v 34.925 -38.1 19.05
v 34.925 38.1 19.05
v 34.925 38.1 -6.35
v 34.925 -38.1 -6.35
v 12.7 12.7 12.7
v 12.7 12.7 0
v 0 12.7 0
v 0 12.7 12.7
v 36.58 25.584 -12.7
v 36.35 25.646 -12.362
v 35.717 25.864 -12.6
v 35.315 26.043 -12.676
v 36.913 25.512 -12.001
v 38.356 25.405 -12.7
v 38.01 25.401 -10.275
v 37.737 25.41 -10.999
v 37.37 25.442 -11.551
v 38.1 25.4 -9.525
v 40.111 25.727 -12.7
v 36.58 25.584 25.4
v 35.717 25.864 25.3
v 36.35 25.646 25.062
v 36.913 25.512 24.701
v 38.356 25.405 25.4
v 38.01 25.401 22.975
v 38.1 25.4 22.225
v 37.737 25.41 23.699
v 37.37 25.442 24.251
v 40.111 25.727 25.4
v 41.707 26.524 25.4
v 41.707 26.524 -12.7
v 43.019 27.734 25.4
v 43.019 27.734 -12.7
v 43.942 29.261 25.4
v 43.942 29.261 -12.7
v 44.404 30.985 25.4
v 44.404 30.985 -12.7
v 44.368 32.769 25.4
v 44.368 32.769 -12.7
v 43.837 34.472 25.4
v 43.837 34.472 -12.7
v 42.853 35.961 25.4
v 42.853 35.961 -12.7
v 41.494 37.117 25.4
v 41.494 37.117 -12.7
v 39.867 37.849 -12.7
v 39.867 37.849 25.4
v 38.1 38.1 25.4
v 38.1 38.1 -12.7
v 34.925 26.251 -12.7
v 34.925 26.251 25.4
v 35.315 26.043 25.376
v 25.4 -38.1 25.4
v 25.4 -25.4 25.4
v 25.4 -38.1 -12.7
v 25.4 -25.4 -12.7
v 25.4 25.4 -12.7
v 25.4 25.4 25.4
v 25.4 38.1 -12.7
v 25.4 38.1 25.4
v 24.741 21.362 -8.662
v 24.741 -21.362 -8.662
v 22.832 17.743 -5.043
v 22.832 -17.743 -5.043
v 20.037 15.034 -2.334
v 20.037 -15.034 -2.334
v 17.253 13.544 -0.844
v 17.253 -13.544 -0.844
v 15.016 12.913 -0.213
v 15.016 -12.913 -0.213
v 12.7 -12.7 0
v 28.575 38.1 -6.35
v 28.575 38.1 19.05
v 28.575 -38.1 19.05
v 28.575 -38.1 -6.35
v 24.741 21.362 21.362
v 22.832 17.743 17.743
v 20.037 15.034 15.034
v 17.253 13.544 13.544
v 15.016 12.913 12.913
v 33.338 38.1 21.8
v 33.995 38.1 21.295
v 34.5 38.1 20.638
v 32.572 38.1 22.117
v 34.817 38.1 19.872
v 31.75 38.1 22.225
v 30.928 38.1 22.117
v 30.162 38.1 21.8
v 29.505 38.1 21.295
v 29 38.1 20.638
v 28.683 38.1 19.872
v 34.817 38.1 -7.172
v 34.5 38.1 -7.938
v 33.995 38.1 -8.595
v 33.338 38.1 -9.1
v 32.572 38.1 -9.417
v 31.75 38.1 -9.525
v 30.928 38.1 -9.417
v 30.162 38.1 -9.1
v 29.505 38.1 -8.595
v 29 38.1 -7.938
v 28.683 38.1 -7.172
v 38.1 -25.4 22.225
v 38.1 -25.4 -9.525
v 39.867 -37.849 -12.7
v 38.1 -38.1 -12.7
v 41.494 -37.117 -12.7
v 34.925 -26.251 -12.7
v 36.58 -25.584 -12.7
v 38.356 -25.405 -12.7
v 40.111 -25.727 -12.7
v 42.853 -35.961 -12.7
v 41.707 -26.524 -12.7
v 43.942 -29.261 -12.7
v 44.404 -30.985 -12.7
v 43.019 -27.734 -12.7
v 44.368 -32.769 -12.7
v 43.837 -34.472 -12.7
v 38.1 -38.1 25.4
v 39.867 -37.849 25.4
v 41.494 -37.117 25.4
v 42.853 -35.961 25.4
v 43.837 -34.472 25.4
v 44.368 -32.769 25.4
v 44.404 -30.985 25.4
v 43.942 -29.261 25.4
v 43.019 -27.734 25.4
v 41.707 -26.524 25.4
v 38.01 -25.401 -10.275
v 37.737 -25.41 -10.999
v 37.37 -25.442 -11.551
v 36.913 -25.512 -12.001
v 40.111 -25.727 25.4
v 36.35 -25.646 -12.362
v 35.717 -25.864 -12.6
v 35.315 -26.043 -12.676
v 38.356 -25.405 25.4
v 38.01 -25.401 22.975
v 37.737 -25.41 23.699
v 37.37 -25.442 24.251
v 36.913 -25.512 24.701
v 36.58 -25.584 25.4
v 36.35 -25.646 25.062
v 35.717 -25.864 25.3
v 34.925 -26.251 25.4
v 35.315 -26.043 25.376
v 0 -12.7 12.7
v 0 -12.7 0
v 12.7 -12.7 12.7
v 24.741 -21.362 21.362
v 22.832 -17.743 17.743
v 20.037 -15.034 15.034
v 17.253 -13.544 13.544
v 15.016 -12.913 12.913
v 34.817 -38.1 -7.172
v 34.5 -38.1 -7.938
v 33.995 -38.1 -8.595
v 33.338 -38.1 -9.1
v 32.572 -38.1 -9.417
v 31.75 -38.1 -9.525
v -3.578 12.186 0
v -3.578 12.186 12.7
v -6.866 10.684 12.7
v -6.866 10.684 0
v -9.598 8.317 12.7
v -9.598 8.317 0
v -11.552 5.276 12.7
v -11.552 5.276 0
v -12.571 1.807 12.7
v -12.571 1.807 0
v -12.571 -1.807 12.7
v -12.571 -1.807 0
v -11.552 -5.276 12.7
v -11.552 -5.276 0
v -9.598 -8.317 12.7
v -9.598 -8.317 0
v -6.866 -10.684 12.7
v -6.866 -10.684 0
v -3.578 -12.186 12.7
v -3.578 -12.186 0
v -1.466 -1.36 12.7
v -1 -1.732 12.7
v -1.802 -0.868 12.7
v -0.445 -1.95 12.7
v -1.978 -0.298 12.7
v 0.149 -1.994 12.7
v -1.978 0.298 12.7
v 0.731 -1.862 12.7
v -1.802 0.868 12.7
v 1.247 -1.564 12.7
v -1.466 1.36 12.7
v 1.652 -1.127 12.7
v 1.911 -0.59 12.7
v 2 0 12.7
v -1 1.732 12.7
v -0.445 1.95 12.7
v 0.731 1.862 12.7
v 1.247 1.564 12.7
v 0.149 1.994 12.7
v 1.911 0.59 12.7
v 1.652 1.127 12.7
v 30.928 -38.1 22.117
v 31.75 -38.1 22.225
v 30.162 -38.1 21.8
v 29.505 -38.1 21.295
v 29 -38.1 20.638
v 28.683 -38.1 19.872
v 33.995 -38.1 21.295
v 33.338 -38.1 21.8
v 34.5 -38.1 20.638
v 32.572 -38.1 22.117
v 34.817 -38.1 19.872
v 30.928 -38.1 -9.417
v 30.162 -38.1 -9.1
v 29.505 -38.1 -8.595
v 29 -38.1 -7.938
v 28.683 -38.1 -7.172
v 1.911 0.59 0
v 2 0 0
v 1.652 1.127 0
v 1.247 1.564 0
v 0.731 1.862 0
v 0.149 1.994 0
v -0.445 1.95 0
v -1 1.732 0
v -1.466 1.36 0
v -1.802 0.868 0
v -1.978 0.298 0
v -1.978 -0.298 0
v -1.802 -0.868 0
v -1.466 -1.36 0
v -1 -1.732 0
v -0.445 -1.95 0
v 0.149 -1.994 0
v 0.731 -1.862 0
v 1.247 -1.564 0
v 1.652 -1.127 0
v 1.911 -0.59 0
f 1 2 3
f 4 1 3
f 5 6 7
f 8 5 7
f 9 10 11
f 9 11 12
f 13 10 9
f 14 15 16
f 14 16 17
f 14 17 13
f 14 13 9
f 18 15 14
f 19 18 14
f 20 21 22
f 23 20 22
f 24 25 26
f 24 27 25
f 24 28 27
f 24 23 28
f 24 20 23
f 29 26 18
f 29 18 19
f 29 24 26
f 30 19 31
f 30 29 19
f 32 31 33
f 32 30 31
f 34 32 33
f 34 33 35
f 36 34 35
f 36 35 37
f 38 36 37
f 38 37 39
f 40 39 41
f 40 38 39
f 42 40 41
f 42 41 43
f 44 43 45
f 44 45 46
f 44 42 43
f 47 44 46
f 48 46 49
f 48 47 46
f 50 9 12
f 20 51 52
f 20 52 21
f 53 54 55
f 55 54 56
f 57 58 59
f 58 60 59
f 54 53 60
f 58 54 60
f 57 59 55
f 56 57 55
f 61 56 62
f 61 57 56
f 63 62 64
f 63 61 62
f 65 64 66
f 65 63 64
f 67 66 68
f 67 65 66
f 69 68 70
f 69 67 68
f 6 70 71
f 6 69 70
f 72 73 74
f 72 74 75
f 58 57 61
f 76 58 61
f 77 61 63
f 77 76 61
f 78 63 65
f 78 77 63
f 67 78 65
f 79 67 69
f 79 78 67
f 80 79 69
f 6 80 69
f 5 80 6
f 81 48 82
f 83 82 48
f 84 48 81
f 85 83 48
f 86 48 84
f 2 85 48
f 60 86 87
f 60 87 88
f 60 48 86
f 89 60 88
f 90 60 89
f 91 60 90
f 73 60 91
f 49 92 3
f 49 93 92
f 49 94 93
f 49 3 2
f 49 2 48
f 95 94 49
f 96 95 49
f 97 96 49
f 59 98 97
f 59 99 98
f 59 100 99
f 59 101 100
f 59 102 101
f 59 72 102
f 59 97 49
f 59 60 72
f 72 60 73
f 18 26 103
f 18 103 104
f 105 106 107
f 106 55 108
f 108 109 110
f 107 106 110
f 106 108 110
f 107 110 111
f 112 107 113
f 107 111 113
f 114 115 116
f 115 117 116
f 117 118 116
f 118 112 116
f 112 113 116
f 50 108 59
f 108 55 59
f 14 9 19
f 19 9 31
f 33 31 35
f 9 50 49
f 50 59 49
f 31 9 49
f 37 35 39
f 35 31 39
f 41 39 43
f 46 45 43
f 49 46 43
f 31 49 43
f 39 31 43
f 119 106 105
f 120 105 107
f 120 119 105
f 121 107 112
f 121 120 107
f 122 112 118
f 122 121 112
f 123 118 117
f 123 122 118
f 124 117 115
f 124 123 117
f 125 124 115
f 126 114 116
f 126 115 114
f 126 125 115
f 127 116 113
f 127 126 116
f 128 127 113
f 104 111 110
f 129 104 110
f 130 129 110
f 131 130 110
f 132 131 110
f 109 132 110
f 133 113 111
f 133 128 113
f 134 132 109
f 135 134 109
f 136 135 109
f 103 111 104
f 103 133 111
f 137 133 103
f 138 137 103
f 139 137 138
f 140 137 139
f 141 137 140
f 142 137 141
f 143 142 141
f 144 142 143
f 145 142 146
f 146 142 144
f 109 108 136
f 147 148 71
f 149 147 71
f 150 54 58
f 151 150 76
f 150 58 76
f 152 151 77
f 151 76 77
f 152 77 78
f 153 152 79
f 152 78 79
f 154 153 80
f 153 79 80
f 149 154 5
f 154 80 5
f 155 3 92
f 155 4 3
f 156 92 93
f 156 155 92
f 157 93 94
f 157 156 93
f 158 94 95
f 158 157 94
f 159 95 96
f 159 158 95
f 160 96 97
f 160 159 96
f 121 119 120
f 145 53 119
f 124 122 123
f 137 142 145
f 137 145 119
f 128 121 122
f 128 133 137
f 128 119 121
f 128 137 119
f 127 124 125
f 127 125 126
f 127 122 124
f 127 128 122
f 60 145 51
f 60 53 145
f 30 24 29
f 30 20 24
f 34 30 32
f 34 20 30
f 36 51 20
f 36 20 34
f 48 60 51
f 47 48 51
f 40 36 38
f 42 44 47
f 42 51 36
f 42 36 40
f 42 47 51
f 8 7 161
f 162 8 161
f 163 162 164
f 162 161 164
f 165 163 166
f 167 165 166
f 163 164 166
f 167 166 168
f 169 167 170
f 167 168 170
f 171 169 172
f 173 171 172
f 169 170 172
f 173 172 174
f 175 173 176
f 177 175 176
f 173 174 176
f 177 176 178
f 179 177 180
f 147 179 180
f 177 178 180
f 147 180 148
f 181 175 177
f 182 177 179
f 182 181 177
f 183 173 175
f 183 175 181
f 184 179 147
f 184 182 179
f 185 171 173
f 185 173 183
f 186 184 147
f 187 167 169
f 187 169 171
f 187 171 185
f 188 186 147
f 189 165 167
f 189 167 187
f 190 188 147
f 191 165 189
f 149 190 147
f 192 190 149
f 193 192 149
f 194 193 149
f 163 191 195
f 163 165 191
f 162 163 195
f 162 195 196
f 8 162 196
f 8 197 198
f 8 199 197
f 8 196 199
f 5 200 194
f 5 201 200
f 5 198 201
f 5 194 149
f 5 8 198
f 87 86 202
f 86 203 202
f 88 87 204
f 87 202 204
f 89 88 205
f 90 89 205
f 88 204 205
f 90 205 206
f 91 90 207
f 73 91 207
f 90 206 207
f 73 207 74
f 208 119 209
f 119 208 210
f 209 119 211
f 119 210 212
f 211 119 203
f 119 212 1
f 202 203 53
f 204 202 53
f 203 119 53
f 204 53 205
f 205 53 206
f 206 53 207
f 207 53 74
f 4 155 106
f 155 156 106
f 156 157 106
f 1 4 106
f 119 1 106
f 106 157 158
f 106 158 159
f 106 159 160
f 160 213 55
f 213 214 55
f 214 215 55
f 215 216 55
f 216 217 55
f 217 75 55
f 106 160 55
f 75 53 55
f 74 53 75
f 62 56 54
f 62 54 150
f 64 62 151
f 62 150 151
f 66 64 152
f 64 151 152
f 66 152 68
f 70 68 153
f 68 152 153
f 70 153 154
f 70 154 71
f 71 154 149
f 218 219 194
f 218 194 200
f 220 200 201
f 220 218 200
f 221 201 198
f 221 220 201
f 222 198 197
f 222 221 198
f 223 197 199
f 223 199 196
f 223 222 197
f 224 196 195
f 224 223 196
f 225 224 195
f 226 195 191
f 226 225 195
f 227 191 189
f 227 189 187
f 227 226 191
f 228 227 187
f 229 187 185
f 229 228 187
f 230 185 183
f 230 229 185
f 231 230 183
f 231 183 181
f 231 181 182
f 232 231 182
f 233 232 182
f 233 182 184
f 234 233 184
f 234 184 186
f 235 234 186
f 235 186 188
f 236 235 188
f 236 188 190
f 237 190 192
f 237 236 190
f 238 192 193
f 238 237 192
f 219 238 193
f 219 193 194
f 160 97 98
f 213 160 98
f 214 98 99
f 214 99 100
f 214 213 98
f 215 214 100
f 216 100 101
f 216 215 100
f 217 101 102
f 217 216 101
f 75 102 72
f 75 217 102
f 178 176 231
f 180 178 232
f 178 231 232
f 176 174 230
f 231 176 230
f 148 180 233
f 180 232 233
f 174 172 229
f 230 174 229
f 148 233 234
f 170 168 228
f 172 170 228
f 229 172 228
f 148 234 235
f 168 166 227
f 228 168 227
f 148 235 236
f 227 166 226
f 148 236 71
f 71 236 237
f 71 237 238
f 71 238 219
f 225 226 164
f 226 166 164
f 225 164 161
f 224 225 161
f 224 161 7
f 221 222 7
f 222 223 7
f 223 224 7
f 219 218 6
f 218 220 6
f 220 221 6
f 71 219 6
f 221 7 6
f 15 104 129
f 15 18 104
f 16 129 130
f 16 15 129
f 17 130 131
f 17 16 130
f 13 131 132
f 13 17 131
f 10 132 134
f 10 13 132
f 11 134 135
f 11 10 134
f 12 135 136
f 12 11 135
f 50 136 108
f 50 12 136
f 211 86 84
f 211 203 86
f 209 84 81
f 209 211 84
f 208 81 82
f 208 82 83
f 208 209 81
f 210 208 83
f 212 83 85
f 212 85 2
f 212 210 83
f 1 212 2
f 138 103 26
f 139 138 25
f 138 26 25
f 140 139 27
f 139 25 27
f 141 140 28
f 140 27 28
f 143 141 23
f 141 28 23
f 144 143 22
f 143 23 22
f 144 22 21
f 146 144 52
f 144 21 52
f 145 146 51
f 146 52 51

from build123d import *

# Parameters (mm, degrees)
SKETCH1_R           = 12.7
SKETCH1_R_2         = 2
BOSS_EXTRUDE1_DEPTH = 12.7
SKETCH2_W           = 38.1
SKETCH2_H           = 76.2
BOSS_EXTRUDE2_DEPTH = 12.7
FILLET1_R           = 12.7
SKETCH3_W           = 6.35
SKETCH3_H           = 31.75
CUT_EXTRUDE1_DEPTH  = 89.9
BOSS_EXTRUDE3_DEPTH = 38.1
FILLET2_R           = 3.175


with BuildPart() as part:
    # Sketch1 → Boss-Extrude1 (new body)
    # profile 1 of 2: a face of its own
    with BuildSketch(Plane.XY):
        Circle(SKETCH1_R)
        Circle(SKETCH1_R_2, mode=Mode.SUBTRACT)
    # profile 2 of 2: a face of its own
    with BuildSketch(Plane.XY):
        with BuildLine():
            ThreePointArc((12.7, 0), (8.980256121, -8.980256121), (0, -12.7))
            Line((0, -12.7), (25.4, -12.7))
            Line((25.4, -12.7), (25.4, 12.7))
            Line((25.4, 12.7), (0, 12.7))
            ThreePointArc((0, 12.7), (8.980256121, 8.980256121), (12.7, 0))
        make_face()
    extrude(amount=BOSS_EXTRUDE1_DEPTH)

    # Sketch2 → Boss-Extrude2 (add)
    with BuildSketch(Plane(origin=(25.4, 0, 0), x_dir=(0, 0, -1), z_dir=(1, 0, 0))):
        with Locations((-6.35, 0)):
            Rectangle(SKETCH2_W, SKETCH2_H)
    extrude(amount=BOSS_EXTRUDE2_DEPTH)

    # Fillet1
    fillet1_edges = [part.edges().sort_by_distance(p)[0] for p in [
        (25.4, 12.7, 6.35),
        (25.4, -12.7, 6.35),
        (25.4, 0, 12.7),
        (25.4, 0, 0),
    ]]
    fillet(fillet1_edges, radius=FILLET1_R - 0.0001)  # a hair under: the kernel refuses the full size

    # Sketch3 → Cut-Extrude1 (cut, through all)
    with BuildSketch(Plane(origin=(0, 38.1, 0), x_dir=(1, 0, 0), z_dir=(0, 1, 0))):
        with Locations((31.75, -6.35)):
            Rectangle(SKETCH3_W, SKETCH3_H)
    extrude(amount=-CUT_EXTRUDE1_DEPTH, mode=Mode.SUBTRACT)

    # Sketch4 → Boss-Extrude3 (add)
    with BuildSketch(Plane.XY.offset(25.4)):
        with BuildLine():
            Line((38.1, 38.1), (38.1, 25.4))
            ThreePointArc((38.1, 25.4), (44.45, 31.75), (38.1, 38.1))
        make_face()
        with BuildLine():
            Line((38.1, -25.4), (38.1, -38.1))
            ThreePointArc((38.1, -38.1), (44.45, -31.75), (38.1, -25.4))
        make_face()
    extrude(amount=-BOSS_EXTRUDE3_DEPTH)

    # Fillet2
    fillet2_edges = [part.edges().sort_by_distance(p)[0] for p in [
        (34.925, 0, 22.225),
        (28.575, 0, 22.225),
        (34.925, 0, -9.525),
        (28.575, 0, -9.525),
        (38.1, 0, 25.4),
        (38.1, 0, -12.7),
    ]]
    fillet(fillet2_edges, radius=FILLET2_R - 0.0001)  # a hair under: the kernel refuses the full size


solid = part.part
